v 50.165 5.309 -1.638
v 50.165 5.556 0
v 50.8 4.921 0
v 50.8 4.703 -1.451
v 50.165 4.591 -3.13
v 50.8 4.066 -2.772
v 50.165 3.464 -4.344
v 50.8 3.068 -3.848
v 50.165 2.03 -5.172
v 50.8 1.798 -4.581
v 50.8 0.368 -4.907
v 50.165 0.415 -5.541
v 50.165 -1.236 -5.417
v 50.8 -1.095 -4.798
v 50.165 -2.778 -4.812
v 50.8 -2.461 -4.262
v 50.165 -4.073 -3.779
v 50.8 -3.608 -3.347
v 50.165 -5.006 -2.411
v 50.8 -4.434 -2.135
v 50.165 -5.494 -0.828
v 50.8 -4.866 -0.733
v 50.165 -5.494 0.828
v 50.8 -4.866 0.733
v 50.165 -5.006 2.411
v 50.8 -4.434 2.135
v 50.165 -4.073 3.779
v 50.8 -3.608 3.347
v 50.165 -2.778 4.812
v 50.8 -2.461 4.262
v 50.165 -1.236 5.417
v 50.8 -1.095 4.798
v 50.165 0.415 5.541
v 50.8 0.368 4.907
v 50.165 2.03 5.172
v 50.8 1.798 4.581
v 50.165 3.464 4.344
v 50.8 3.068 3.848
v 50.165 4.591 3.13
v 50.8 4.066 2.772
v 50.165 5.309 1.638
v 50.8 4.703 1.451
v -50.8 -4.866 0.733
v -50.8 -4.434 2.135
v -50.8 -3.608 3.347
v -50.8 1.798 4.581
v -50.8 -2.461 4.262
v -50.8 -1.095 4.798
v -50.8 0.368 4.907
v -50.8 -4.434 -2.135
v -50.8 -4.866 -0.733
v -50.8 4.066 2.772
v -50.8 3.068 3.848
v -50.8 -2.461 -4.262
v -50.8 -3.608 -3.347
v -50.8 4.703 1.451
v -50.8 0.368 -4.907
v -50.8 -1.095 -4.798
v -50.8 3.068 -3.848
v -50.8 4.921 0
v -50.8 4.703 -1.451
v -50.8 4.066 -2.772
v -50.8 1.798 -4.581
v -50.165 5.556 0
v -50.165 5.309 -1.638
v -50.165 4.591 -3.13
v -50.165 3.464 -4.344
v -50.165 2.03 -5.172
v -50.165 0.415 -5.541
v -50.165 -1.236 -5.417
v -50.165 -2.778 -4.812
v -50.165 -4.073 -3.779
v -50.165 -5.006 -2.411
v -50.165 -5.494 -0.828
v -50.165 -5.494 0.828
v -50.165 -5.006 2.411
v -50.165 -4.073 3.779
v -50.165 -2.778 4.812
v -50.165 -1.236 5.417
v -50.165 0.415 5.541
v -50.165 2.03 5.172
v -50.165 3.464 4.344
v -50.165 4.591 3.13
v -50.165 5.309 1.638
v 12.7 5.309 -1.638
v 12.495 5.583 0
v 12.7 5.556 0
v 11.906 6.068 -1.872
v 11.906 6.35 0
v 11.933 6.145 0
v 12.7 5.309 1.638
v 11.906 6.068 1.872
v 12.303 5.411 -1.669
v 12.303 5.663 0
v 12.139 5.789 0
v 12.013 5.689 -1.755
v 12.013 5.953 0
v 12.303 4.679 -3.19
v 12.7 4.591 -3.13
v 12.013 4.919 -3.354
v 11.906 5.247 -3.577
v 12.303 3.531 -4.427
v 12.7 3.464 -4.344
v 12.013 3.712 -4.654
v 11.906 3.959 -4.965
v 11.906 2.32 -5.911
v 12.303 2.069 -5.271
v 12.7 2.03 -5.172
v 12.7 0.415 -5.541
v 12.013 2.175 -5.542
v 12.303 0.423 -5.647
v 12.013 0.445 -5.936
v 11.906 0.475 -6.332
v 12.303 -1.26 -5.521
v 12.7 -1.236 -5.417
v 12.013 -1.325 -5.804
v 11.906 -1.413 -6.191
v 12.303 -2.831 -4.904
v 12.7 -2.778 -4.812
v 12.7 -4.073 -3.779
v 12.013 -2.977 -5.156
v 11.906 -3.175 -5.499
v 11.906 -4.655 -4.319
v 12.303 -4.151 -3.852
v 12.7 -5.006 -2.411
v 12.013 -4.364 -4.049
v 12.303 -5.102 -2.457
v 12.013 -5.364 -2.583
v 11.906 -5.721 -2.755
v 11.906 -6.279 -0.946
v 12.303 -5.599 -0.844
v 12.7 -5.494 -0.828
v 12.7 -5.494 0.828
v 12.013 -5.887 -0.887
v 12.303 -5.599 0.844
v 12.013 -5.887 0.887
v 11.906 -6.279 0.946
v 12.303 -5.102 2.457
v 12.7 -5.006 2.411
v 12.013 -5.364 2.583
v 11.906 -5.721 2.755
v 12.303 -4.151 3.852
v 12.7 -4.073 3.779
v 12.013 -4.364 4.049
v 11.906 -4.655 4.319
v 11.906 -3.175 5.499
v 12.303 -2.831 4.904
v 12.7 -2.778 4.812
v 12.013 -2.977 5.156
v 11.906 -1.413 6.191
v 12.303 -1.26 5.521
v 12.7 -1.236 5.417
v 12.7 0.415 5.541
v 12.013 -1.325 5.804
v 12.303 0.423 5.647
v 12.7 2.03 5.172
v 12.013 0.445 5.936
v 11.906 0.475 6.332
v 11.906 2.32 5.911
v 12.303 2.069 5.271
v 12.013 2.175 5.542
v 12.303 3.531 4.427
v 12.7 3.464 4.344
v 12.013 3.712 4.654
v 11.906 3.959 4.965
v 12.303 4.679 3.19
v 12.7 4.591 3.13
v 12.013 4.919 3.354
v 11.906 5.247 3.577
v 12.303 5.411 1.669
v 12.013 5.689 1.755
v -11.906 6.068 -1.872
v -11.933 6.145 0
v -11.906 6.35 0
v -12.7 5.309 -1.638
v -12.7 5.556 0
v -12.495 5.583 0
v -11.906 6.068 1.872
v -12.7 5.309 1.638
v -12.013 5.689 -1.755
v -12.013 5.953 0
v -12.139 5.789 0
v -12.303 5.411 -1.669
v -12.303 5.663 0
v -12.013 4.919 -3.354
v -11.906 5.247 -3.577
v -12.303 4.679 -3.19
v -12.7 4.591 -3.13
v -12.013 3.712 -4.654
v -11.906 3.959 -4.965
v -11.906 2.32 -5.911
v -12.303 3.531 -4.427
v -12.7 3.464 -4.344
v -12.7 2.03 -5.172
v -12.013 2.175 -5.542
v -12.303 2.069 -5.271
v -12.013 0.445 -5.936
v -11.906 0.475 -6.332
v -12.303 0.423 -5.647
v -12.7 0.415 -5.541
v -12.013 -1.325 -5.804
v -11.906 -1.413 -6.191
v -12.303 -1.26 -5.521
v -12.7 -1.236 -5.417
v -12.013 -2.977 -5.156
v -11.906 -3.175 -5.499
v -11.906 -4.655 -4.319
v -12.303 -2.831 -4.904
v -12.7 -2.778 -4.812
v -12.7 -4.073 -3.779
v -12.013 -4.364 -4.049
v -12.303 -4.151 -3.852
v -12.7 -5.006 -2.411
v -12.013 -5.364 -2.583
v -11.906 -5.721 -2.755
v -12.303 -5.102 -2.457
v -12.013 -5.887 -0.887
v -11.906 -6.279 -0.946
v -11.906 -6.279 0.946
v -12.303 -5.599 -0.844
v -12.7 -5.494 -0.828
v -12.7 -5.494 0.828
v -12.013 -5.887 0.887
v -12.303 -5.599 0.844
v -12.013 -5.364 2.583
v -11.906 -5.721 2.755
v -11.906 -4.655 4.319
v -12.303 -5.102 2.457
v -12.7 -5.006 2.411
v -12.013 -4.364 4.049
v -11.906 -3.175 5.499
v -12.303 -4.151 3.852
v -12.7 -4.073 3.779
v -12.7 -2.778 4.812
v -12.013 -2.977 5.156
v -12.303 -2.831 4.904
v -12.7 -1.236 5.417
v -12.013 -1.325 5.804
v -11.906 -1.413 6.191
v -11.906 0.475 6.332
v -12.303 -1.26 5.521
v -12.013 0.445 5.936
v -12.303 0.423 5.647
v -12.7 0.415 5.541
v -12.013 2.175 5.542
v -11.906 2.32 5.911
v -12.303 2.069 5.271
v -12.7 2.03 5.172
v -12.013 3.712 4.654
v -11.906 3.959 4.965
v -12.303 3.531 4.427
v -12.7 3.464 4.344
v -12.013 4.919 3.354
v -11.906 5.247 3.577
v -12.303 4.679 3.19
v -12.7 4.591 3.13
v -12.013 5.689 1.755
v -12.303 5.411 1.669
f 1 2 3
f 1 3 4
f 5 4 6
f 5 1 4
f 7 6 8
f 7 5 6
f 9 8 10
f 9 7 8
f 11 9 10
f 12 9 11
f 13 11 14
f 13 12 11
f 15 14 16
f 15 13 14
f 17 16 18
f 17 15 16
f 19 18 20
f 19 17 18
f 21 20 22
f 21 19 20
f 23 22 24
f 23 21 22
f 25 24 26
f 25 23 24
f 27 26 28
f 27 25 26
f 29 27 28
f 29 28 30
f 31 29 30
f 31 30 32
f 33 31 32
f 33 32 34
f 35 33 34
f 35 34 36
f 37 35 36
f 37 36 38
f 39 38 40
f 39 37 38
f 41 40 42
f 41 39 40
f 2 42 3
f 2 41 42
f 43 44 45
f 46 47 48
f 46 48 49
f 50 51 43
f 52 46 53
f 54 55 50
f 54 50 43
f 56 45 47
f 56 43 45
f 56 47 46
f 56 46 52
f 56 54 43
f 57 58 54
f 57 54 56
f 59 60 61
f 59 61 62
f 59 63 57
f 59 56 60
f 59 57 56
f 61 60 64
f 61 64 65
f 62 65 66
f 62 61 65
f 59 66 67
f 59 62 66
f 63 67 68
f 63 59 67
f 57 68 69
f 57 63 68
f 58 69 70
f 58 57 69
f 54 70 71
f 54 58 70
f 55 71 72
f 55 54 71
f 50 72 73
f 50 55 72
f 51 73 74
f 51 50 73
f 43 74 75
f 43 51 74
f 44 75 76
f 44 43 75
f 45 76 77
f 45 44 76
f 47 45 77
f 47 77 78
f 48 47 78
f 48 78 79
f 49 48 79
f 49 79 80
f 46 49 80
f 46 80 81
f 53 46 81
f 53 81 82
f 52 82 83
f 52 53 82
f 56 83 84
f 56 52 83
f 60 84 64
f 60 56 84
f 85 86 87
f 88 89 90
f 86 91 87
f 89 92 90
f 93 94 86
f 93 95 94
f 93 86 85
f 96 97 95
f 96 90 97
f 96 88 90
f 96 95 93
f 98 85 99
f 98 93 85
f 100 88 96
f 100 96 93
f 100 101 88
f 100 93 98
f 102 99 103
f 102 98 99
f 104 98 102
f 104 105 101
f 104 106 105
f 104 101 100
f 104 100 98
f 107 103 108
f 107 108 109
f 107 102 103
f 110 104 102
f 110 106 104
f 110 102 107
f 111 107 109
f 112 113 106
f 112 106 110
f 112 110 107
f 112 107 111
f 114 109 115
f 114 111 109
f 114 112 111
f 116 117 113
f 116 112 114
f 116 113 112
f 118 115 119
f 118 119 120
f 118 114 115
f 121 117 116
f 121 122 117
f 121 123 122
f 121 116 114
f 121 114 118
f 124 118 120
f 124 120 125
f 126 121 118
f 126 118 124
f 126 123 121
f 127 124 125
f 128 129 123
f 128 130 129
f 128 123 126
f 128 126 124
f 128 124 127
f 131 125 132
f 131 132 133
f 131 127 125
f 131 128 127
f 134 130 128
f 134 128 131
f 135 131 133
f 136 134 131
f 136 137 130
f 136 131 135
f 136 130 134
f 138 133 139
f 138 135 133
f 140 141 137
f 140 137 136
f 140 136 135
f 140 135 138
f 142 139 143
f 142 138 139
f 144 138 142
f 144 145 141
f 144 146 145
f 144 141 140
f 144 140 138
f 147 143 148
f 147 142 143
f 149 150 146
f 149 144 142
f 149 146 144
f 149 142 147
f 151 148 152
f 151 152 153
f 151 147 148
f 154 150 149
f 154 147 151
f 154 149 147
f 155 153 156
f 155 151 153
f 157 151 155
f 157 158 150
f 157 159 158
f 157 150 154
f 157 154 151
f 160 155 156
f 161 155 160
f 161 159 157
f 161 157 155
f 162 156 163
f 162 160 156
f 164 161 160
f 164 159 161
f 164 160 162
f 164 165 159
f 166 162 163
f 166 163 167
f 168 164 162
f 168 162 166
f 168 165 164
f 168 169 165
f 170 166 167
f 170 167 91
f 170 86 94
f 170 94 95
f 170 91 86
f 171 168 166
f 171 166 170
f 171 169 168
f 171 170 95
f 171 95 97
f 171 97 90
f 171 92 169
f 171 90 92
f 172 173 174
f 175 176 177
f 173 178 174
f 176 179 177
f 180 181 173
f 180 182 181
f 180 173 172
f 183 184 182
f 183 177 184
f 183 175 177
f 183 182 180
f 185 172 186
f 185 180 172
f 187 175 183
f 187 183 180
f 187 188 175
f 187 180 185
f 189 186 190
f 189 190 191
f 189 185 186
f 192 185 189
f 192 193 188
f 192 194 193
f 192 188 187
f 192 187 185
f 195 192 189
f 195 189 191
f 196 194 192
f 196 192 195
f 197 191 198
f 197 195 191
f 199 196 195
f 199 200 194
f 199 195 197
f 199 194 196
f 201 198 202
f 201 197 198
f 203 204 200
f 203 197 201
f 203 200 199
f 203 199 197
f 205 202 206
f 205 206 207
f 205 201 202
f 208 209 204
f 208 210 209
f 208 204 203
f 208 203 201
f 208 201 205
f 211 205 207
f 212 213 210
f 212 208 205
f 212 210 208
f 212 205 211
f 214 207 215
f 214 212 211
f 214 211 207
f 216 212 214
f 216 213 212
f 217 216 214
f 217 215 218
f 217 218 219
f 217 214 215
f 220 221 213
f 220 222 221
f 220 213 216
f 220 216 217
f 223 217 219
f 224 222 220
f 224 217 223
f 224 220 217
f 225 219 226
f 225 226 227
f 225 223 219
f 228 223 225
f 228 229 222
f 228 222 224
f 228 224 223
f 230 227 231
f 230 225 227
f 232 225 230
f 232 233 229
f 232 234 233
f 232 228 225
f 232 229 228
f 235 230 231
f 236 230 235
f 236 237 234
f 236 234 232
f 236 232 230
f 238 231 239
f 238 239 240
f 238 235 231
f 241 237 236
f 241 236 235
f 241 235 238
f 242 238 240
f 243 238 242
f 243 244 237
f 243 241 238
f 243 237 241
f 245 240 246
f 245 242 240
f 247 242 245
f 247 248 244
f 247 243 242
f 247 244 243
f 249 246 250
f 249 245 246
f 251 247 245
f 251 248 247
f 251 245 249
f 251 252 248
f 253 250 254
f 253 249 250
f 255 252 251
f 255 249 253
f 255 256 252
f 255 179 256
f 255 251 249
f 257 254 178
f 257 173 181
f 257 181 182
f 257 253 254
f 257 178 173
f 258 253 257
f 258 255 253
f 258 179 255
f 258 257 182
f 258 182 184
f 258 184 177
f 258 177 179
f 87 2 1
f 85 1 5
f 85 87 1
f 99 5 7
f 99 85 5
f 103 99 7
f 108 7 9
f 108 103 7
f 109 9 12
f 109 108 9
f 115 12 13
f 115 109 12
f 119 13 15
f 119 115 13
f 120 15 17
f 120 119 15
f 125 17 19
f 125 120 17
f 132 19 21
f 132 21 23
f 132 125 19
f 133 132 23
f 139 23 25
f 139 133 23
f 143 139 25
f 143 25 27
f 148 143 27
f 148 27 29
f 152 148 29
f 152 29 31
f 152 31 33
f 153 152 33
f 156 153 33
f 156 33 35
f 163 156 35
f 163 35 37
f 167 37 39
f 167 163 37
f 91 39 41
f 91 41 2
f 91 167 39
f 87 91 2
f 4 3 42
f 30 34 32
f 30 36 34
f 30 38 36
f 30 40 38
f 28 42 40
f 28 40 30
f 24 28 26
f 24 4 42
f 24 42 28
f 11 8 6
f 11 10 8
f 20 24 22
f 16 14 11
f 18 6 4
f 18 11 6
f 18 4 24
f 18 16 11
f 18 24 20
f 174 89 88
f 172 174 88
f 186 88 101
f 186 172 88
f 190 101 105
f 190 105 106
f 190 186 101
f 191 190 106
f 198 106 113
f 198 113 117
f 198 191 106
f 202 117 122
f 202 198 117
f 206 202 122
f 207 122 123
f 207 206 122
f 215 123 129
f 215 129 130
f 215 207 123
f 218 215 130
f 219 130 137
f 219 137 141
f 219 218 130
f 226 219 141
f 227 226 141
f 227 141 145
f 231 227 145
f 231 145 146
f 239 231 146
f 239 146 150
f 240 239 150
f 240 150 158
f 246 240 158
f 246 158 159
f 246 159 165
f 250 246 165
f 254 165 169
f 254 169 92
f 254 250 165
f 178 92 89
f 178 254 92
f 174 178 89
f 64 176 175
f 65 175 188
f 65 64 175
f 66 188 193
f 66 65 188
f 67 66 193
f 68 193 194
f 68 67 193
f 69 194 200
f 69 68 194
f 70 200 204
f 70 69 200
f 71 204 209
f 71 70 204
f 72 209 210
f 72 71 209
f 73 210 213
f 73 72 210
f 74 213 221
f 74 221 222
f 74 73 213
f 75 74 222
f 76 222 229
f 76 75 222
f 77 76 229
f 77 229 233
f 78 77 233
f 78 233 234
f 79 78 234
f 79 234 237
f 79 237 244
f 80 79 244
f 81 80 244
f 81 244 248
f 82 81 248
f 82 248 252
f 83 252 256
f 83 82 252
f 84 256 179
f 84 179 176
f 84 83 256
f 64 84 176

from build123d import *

# Parameters (mm, degrees)
CHAMFER1_SIZE = 0.635


with BuildPart() as part:
    # Sketch1 → Revolve1 (revolve)
    with BuildSketch(Plane.XY):
        with BuildLine():
            Line((-50.8, 0), (50.8, 0))
            Line((50.8, 0), (50.8, 5.55625))
            Line((50.8, 5.55625), (12.7, 5.55625))
            ThreePointArc((12.7, 5.55625), (12.138733992, 5.788733992), (11.90625, 6.35))
            Line((11.90625, 6.35), (-11.90625, 6.35))
            ThreePointArc((-11.90625, 6.35), (-12.138733992, 5.788733992), (-12.7, 5.55625))
            Line((-12.7, 5.55625), (-50.8, 5.55625))
            Line((-50.8, 5.55625), (-50.8, 0))
        make_face()
    revolve(axis=Axis((-50.8, 0, 0), (-1, 0, 0)))

    # Chamfer1
    chamfer1_edges = [part.edges().sort_by_distance(p)[0] for p in [
        (-50.8, -5.55625, 0),
        (50.8, -5.55625, 0),
    ]]
    chamfer(chamfer1_edges, length=CHAMFER1_SIZE)


solid = part.part
